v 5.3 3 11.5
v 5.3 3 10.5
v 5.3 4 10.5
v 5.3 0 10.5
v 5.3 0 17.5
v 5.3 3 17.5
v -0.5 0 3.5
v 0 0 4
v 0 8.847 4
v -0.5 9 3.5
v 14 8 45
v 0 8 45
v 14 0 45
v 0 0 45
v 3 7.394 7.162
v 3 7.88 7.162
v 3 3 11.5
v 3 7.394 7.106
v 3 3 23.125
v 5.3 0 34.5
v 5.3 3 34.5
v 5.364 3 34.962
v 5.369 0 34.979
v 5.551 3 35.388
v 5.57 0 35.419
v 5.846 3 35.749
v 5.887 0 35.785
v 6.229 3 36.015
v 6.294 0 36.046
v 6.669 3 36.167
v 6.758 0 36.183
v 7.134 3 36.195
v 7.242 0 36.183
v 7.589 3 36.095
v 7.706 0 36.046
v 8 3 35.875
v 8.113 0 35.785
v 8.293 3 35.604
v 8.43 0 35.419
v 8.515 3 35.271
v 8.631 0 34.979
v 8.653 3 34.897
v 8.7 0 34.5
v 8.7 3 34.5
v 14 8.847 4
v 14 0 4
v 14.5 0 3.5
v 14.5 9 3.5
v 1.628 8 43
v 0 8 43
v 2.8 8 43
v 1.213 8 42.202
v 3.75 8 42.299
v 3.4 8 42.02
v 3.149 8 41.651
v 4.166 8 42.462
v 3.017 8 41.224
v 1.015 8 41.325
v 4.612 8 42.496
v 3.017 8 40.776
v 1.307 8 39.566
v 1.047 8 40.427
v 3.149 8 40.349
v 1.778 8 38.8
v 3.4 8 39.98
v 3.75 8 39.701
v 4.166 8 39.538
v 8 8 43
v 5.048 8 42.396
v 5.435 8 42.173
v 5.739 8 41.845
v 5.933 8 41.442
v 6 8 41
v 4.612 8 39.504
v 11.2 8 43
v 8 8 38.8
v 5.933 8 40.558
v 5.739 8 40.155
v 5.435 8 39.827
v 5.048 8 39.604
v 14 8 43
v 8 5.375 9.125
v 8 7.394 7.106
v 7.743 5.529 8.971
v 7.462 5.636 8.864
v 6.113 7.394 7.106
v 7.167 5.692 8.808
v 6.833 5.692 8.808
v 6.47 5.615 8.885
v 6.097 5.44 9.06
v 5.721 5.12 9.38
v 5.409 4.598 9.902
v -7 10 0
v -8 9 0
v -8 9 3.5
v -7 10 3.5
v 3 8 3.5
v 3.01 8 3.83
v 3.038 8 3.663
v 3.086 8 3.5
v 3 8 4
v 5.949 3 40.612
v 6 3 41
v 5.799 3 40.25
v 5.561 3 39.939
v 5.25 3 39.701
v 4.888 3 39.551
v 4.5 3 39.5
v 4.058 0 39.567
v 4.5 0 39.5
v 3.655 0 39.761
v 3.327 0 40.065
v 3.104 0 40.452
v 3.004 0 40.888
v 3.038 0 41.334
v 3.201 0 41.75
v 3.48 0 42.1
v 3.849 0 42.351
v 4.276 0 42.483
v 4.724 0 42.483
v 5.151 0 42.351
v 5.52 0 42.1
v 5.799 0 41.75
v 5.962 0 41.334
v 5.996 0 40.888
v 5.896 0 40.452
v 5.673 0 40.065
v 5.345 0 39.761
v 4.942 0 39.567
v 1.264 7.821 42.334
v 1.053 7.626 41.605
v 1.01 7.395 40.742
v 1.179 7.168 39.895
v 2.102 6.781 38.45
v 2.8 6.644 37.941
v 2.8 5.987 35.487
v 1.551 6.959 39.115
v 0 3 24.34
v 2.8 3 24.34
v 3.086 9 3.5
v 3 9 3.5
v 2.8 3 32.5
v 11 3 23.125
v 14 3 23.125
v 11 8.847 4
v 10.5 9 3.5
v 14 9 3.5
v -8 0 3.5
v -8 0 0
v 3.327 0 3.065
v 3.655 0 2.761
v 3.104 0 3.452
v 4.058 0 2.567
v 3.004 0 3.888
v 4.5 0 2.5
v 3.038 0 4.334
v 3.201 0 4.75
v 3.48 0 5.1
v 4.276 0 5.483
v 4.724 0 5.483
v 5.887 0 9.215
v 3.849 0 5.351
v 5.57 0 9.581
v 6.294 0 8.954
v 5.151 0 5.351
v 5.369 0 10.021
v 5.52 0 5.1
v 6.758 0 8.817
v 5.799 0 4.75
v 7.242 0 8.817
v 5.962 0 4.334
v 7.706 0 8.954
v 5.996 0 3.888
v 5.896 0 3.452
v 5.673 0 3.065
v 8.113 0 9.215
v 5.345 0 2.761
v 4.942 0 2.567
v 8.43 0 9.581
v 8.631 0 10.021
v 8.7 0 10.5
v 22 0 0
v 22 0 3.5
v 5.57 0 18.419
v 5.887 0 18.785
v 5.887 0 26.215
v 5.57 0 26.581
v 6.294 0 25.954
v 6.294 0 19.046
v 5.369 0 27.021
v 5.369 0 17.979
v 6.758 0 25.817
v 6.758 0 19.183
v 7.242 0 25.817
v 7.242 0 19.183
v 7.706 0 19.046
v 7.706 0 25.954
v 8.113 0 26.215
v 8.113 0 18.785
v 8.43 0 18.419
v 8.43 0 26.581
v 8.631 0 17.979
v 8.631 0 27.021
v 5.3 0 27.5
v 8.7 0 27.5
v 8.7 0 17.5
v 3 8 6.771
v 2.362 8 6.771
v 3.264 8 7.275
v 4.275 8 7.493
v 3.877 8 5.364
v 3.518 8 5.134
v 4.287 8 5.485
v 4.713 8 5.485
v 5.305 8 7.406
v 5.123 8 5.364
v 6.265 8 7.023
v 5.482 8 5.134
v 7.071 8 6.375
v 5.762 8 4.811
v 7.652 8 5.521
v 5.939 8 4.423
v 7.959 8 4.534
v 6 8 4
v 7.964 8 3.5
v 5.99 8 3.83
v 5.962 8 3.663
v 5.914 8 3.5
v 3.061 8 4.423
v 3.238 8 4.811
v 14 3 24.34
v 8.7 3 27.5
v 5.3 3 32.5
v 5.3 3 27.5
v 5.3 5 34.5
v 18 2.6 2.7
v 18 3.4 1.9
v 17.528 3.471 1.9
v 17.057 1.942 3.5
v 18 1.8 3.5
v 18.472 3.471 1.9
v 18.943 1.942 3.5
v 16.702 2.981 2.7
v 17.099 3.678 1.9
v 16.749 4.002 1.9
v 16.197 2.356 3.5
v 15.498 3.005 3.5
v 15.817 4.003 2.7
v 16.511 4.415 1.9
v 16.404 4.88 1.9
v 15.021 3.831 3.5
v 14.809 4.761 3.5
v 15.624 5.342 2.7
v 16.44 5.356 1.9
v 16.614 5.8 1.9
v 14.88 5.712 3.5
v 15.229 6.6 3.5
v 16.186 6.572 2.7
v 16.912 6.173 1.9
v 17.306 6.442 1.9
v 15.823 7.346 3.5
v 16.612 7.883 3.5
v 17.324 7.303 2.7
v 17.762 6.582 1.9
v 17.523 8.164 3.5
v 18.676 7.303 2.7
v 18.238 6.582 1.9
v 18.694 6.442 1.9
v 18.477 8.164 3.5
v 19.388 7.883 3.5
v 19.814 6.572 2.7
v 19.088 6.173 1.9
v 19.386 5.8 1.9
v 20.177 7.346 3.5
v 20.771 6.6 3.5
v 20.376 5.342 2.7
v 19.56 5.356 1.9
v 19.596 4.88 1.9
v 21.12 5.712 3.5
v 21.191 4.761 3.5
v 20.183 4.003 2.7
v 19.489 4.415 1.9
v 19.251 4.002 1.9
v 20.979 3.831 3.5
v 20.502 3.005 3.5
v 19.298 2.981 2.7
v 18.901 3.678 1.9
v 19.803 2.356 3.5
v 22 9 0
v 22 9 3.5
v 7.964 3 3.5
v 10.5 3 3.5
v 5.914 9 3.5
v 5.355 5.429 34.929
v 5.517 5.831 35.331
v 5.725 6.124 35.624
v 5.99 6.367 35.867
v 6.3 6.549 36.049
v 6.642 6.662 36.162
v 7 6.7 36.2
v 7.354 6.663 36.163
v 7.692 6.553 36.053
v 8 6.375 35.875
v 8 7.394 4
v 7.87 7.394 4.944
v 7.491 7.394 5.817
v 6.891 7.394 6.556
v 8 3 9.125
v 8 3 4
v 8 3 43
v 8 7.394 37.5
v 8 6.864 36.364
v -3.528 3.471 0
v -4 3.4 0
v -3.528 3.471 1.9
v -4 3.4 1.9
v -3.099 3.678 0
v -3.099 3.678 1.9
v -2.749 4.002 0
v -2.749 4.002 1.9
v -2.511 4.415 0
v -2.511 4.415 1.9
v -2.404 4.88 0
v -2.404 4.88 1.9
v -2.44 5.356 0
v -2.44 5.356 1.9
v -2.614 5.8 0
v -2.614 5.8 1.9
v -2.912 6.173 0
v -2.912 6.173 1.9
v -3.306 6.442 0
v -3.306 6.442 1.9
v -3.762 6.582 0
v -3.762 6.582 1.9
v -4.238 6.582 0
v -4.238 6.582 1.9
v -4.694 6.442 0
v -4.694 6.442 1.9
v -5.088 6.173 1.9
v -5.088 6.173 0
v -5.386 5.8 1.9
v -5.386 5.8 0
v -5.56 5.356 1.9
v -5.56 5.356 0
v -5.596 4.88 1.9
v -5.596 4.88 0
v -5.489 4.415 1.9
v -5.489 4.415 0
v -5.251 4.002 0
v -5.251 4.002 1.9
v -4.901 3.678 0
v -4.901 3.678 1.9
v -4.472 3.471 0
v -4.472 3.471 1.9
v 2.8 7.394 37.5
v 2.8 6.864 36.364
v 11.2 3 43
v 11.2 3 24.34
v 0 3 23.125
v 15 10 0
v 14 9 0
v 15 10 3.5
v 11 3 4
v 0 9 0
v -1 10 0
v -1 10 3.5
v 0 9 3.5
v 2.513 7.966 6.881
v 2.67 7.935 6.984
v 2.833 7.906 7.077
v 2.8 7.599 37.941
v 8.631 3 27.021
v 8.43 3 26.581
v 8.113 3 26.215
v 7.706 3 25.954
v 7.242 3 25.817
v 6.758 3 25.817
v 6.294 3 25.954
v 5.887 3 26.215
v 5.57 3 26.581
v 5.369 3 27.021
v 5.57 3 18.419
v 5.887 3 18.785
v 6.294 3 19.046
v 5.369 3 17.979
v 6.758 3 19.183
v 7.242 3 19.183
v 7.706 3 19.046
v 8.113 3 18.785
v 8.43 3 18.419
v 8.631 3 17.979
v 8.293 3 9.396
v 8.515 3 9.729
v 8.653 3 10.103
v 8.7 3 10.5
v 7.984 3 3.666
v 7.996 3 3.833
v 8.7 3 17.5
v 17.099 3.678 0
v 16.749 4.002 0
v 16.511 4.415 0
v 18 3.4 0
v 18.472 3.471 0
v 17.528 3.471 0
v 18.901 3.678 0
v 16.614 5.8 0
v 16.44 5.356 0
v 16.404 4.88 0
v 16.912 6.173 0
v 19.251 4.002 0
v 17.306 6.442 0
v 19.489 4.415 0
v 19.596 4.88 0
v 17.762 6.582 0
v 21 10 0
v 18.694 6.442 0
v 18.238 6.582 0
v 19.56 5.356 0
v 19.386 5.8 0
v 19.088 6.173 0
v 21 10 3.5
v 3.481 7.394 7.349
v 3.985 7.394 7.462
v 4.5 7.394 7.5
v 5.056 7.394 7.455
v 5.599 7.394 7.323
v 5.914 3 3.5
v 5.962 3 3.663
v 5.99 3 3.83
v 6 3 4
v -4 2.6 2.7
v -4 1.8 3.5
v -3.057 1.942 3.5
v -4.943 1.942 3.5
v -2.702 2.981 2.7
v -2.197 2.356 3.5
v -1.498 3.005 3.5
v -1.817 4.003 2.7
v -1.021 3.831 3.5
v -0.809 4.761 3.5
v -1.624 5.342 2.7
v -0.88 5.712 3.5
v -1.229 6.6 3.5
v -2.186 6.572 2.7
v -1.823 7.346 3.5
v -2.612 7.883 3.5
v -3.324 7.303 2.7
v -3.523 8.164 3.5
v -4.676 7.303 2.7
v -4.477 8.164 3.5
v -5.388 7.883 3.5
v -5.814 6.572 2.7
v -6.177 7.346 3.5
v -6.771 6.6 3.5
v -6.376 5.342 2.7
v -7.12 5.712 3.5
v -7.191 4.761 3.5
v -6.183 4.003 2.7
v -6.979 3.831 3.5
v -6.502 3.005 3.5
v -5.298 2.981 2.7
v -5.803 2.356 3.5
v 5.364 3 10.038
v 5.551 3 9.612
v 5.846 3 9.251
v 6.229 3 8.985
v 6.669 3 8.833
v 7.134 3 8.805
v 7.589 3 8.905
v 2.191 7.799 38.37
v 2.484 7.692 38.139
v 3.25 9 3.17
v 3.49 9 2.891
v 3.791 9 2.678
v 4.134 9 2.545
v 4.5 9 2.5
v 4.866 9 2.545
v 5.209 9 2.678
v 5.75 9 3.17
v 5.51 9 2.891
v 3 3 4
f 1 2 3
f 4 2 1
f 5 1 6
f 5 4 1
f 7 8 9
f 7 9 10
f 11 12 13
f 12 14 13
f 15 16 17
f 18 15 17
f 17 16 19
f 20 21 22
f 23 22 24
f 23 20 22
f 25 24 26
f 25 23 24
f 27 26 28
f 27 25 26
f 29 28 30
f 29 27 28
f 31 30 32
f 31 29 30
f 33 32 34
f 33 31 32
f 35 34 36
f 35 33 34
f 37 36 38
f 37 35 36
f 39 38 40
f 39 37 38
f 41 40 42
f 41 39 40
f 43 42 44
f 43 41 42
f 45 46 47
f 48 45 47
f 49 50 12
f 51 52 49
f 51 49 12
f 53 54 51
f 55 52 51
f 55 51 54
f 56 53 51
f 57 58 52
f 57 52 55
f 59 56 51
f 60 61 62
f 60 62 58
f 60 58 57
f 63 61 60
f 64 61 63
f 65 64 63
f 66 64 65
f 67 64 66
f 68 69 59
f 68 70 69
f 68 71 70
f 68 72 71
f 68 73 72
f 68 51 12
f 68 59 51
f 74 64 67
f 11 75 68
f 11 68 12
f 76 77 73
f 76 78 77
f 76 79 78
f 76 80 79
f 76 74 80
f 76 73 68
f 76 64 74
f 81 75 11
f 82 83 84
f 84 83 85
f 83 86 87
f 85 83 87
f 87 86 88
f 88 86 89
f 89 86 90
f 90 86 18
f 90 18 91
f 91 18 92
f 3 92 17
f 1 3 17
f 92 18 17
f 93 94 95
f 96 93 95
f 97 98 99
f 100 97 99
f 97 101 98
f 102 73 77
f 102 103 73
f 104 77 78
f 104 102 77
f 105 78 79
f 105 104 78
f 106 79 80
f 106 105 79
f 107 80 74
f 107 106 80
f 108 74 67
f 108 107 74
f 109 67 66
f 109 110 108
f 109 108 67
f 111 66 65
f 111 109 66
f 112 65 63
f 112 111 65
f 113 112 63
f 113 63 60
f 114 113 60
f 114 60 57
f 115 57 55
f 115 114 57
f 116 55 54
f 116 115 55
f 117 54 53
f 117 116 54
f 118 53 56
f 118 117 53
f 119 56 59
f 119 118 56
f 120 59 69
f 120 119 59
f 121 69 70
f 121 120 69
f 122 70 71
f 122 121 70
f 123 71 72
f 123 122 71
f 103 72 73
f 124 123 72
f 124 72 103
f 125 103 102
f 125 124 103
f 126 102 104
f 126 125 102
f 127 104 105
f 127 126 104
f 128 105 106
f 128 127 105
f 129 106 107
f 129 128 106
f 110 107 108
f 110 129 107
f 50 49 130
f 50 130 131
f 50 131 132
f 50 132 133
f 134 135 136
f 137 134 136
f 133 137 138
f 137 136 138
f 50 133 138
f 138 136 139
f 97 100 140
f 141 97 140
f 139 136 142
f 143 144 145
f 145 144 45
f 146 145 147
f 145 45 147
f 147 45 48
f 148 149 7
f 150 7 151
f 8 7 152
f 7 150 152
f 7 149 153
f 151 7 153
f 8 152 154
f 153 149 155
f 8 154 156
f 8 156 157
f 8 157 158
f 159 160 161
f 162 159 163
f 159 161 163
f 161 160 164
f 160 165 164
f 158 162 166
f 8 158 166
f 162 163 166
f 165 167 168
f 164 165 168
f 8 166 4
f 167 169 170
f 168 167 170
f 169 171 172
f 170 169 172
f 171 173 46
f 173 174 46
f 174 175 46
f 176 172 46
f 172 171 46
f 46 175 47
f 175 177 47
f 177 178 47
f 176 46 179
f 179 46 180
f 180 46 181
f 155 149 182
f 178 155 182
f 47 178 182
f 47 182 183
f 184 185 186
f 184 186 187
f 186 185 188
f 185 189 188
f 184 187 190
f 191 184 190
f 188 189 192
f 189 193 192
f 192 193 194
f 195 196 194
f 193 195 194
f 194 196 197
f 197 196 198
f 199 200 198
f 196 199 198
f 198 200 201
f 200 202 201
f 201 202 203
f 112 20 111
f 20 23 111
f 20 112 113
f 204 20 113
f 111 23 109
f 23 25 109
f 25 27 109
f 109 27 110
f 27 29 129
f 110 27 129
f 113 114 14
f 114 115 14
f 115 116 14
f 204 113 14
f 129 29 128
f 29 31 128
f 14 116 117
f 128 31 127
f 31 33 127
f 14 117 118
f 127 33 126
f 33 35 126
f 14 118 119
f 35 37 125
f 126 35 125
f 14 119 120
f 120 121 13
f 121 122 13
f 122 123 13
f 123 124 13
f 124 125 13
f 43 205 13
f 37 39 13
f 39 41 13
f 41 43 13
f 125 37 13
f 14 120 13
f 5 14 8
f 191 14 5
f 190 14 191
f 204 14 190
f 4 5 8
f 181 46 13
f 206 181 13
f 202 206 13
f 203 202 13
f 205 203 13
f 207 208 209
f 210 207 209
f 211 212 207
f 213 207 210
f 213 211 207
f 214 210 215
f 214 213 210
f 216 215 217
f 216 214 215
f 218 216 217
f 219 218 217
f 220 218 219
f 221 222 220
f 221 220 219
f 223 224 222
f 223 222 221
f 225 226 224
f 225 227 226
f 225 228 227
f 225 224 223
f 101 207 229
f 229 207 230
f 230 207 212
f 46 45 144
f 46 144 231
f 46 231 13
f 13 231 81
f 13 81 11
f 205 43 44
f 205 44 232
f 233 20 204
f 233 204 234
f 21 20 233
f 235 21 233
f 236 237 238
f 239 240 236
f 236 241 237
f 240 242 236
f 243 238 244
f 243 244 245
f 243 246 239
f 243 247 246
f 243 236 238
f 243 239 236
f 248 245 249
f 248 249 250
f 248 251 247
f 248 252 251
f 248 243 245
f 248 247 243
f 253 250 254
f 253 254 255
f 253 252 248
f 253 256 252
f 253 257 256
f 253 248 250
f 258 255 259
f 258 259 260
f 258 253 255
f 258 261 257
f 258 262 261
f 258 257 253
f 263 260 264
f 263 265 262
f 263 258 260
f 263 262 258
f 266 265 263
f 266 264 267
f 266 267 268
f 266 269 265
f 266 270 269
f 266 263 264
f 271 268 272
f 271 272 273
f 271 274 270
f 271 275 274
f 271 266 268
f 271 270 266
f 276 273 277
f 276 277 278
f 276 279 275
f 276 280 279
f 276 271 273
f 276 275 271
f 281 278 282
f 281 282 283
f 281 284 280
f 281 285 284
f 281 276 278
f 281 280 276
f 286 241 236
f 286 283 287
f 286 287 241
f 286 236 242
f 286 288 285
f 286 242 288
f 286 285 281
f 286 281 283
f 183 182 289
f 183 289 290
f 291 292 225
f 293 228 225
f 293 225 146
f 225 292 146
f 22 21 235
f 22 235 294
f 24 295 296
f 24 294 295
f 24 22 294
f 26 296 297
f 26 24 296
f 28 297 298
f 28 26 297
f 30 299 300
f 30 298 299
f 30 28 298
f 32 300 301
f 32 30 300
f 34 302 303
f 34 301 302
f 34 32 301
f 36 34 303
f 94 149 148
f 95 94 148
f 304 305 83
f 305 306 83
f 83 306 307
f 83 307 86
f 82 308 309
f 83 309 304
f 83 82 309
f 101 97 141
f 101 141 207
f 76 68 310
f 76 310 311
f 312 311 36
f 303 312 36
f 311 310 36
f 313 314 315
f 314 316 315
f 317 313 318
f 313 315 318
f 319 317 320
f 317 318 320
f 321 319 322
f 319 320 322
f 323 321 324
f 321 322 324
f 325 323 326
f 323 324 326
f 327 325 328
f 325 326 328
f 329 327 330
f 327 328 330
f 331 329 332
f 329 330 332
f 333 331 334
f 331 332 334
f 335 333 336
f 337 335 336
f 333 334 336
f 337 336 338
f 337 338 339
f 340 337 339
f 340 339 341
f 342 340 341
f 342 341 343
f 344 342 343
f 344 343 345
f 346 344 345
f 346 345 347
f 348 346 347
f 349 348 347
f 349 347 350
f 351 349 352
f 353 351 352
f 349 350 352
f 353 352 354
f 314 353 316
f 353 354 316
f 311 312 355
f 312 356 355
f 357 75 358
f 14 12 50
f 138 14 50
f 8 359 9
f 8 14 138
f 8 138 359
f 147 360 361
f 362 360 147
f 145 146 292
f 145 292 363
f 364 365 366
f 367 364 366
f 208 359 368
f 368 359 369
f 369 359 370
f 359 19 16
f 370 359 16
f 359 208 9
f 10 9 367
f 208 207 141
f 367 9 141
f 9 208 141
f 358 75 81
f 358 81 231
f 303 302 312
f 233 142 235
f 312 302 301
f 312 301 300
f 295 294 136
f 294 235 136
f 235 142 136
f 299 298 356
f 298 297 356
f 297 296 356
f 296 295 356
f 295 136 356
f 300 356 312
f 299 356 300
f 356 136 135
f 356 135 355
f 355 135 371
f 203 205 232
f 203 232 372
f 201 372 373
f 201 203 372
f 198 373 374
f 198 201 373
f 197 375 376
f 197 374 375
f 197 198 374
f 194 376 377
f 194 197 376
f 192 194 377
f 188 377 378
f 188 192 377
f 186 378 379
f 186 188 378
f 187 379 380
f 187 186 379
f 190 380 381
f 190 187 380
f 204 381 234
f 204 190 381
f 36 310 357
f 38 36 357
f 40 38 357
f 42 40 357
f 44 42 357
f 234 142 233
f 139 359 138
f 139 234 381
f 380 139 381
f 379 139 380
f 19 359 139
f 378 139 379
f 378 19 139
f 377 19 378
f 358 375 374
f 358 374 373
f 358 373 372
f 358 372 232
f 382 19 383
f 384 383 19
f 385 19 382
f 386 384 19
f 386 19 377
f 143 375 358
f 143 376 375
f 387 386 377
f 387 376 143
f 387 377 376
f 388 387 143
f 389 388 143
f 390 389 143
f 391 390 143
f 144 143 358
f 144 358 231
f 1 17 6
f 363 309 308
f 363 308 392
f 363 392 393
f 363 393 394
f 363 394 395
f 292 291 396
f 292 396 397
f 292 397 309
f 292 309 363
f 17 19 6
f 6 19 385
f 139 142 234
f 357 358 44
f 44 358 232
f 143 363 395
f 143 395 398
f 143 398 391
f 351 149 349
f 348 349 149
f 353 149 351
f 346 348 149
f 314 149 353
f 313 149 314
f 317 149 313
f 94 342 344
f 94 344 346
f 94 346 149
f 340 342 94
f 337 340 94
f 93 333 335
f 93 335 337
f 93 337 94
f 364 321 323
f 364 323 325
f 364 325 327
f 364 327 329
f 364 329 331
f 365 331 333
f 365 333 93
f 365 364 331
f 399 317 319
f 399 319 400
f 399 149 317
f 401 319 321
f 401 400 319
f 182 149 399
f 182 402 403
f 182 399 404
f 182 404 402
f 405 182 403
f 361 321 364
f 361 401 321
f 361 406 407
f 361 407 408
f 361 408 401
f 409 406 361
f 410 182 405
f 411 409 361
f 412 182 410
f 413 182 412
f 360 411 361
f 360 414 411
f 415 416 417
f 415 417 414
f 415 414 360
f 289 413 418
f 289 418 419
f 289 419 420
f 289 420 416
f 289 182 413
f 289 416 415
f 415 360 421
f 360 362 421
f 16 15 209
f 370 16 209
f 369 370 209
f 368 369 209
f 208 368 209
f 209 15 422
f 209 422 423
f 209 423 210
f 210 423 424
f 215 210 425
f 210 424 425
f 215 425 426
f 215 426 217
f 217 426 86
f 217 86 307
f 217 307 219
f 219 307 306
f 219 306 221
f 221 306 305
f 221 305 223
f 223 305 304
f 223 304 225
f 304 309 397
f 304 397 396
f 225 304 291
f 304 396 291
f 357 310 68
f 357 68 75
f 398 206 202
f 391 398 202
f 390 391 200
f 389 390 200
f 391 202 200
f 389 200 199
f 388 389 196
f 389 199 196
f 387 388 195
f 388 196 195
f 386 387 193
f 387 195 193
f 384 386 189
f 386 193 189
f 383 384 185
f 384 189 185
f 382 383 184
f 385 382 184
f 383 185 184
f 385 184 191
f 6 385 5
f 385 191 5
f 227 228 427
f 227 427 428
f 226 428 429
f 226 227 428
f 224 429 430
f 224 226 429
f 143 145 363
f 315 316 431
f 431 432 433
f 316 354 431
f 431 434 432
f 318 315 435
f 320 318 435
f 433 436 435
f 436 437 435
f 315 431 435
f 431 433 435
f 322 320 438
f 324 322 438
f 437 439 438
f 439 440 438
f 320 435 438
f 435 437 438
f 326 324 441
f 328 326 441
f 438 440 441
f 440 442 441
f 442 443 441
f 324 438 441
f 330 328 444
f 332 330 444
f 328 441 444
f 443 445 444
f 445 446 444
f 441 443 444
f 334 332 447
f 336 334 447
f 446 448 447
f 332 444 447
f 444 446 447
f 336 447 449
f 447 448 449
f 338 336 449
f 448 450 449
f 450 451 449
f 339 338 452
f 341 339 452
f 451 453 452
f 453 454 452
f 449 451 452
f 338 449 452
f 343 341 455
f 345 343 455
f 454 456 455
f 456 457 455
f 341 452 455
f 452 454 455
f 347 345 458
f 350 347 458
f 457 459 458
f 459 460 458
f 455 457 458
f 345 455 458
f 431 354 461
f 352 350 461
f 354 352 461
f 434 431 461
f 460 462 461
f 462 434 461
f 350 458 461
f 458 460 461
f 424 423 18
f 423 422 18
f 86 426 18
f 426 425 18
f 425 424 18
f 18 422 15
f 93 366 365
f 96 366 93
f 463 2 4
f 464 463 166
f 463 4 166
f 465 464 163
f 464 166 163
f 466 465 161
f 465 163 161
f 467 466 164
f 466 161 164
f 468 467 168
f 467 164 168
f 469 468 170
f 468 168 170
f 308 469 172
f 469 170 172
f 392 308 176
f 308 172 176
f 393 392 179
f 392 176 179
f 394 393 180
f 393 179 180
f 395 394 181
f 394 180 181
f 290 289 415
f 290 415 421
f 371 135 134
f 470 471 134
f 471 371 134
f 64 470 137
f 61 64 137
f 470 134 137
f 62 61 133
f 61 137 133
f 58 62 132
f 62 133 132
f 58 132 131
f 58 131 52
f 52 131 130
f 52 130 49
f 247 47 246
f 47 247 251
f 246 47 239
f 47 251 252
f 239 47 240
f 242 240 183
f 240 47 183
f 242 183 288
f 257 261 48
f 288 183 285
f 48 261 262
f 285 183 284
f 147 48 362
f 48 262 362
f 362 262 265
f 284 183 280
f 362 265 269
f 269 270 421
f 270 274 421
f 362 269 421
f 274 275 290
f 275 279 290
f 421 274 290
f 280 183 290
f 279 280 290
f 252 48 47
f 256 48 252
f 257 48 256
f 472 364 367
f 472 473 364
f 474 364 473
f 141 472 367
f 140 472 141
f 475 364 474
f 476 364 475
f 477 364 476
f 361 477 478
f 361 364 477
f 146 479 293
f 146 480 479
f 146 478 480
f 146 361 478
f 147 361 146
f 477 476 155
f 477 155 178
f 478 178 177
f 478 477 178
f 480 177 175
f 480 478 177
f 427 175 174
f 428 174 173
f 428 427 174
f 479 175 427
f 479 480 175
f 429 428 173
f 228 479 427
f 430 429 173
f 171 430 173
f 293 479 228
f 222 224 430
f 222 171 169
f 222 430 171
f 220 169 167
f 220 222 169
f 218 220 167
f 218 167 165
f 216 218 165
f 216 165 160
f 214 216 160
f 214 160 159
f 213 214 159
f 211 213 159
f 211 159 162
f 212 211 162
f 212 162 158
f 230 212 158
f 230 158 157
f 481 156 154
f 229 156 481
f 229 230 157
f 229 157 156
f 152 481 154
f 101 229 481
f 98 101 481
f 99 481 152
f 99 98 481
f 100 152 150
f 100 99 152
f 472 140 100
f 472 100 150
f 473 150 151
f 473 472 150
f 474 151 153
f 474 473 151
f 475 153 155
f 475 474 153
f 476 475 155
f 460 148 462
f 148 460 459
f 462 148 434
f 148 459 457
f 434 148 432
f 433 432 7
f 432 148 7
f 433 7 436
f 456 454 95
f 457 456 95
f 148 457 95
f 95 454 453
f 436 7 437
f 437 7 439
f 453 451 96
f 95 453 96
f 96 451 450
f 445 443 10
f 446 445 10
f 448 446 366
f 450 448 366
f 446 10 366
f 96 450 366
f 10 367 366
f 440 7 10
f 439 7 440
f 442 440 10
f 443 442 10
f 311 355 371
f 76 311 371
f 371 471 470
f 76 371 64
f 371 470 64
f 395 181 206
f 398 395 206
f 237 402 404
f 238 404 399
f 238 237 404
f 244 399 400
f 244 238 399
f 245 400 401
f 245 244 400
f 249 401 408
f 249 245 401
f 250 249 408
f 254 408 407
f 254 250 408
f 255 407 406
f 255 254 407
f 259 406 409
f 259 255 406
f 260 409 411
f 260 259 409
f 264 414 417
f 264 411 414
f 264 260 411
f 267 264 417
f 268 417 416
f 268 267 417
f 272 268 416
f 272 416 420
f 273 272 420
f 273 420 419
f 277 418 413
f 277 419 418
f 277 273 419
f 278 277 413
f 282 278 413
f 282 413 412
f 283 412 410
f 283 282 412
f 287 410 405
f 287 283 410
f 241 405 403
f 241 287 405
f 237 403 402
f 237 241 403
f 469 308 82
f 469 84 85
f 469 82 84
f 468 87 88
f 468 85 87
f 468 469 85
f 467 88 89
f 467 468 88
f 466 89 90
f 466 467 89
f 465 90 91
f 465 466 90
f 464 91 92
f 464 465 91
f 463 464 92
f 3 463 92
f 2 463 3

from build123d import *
from build123d.topology import SkipClean

# Parameters (mm, degrees)
SKETCH_1_W               = 14
SKETCH_1_H               = 45
EXTRUDE_1_DEPTH          = 3
SKETCH_4_W               = 8
SKETCH_4_H               = 3.5
EXTRUDE_2_DEPTH          = 10
SKETCH_10_W              = 3.5
SKETCH_10_H              = 6
EXTRUDE_3_DEPTH          = 14
CUT_EXTRUDE_1_DEPTH      = 52.078371156
CUT_EXTRUDE_1_DEPTH_BACK = 52.078371156
SKETCH_2_R               = 1.5
SKETCH_3_R               = 3.5
SKETCH_3_R_2             = 1.5
EXTRUDE_1_2_DEPTH        = 5
SKETCH_12_W              = 14
SKETCH_12_H              = 2
EXTRUDE_4_DEPTH          = 5
RIB_9_REACH              = 53.078
SKETCH_13_WALL_W         = 123.475258838
SKETCH_13_WALL_H         = 2.8
RIB_8_REACH              = 53.078
SKETCH_11_WALL_W         = 124.678564032
SKETCH_11_WALL_H         = 3
CHAMFER_3_SIZE           = 0.5
CHAMFER_4_SIZE           = 1
EXTRUDE_5_REACH          = 46.612
EXTRUDE_5_END_RADIUS     = 3.5
SKETCH_15_W              = 5.2
SKETCH_15_H              = 5
CHAMFER_5_SIZE           = 0.606199956
CHAMFER_5_SIZE_2         = 1.3
CUT_EXTRUDE_2_DEPTH      = 4
EXTRUDE_START            = 3
EXTRUDE_6_DEPTH          = 4.393800044
CUT_EXTRUDE_3_DEPTH      = 1
CHAMFER_START            = 2.8
CHAMFER_6_DEPTH          = 2.5
CHAMFER_START_2          = 5.3
CHAMFER_6_2_DEPTH        = 2.7
CHAMFER_START_3          = 3
CHAMFER_6_3_DEPTH        = 3.7
DELETE_START             = 2
DELETE_FACE_1_DEPTH      = 6


with BuildPart() as part:
    # 草图1 → Extrude 1 (new body)
    with BuildSketch(Plane(origin=(0, 0, 0), x_dir=(1, 0, 0), z_dir=(0, 1, 0))):
        with Locations((7, -22.5)):
            Rectangle(SKETCH_1_W, SKETCH_1_H)
    extrude(amount=EXTRUDE_1_DEPTH)

    # 草图4 → 凸台-拉伸2 (add)
    with BuildSketch(Plane.XZ):
        with Locations((18, 1.75)):
            Rectangle(SKETCH_4_W, SKETCH_4_H)
    extrude_2 = extrude(amount=-EXTRUDE_2_DEPTH)

    # 草图9 → 打孔尺寸(%根据)内六角花形半沉头螺钉的类型1 (revolve, cut)
    with BuildSketch(Plane(origin=(18, 5, 3.5), x_dir=(0, -1, 0), z_dir=(1, 0, 0))):
        Polygon((0, 0), (0, 5.96137699), (1.6, 5), (1.6, 1.6), (3.2, 0), align=None)
    hole_wizard_1 = revolve(axis=Axis((18, 5, 9.85), (0, 0, -1)), mode=Mode.SUBTRACT)

    # 镜向1: 凸台-拉伸2, 打孔尺寸(%根据)内六角花形半沉头螺钉的类型1 across plane
    add(extrude_2.mirror(Plane(origin=(7, 0, 0), x_dir=(0, 0, 1), z_dir=(1, 0, 0))))
    add(hole_wizard_1.mirror(Plane(origin=(7, 0, 0), x_dir=(0, 0, 1), z_dir=(1, 0, 0))), mode=Mode.SUBTRACT)

    # 草图10 → 凸台-拉伸3 (add)
    with BuildSketch(Plane.ZY.offset(-14)):
        with Locations((1.75, 6)):
            Rectangle(SKETCH_10_W, SKETCH_10_H)
    extrude(amount=EXTRUDE_3_DEPTH)

    # 草图2 → 切除-拉伸1 (cut, two sides: drawn at the far end of the back side and taken through both)
    with BuildSketch(Plane.XZ.offset(-CUT_EXTRUDE_1_DEPTH_BACK)):
        with Locations(Location((4.5, 41, 0), (0, 0, 270))):
            Circle(SKETCH_2_R)
        with Locations(Location((4.5, 4, 0), (0, 0, 270))):
            Circle(SKETCH_2_R)
    extrude(amount=CUT_EXTRUDE_1_DEPTH + CUT_EXTRUDE_1_DEPTH_BACK, mode=Mode.SUBTRACT)

    # 草图3 → Extrude 1 2 (add)
    # profile 1 of 2: a face of its own
    with SkipClean():  # the faces are left unmerged after this step: merging them gives an invalid solid
        with BuildSketch(Plane(origin=(0, 3, 0), x_dir=(1, 0, 0), z_dir=(0, 1, 0))):
            with Locations((4.5, -41)):
                Circle(SKETCH_3_R)
            with Locations((4.5, -41)):
                Circle(SKETCH_3_R_2, mode=Mode.SUBTRACT)
        # profile 2 of 2: a face of its own
        with BuildSketch(Plane(origin=(0, 3, 0), x_dir=(1, 0, 0), z_dir=(0, 1, 0))):
            with Locations((4.5, -4)):
                Circle(SKETCH_3_R)
            with Locations((4.5, -4)):
                Circle(SKETCH_3_R_2, mode=Mode.SUBTRACT)
        extrude(amount=EXTRUDE_1_2_DEPTH)

    # 草图12 → 凸台-拉伸4 (add)
    with SkipClean():  # the faces are left unmerged after this step: merging them gives an invalid solid
        with BuildSketch(Plane(origin=(0, 3, 0), x_dir=(1, 0, 0), z_dir=(0, 1, 0))):
            with Locations((7, -44)):
                Rectangle(SKETCH_12_W, SKETCH_12_H)
        extrude(amount=EXTRUDE_4_DEPTH)

    # 草图13 wall → 筋9 (add, up to next)
    with BuildSketch(Plane(origin=(14, 5.5, 33.669872981), x_dir=(0, -0.258819045101, -0.96592582629), z_dir=(0, 0.96592582629, -0.258819045101)), mode=Mode.PRIVATE) as rib_9_sk1:
        with Locations((0, 1.4)):
            Rectangle(SKETCH_13_WALL_W, SKETCH_13_WALL_H)
    rib_9_tool1 = extrude(rib_9_sk1.sketch, amount=-RIB_9_REACH, mode=Mode.PRIVATE) - part.part
    rib_9 = rib_9_tool1.solids().sort_by_distance((14, 5.5, 33.669872981))[0]
    add(rib_9)

    # 草图11 wall → 筋8 (add, up to next)
    with BuildSketch(Plane(origin=(14, 6, 13.312557855), x_dir=(0, -0.292371704721, 0.956304755963), z_dir=(0, -0.956304755963, -0.292371704721)), mode=Mode.PRIVATE) as rib_8_sk1:
        with Locations((0, 1.5)):
            Rectangle(SKETCH_11_WALL_W, SKETCH_11_WALL_H)
    rib_8_tool1 = extrude(rib_8_sk1.sketch, amount=RIB_8_REACH, mode=Mode.PRIVATE) - part.part
    rib_8 = rib_8_tool1.solids().sort_by_distance((14, 6, 13.312557855))[0]
    add(rib_8)

    # 镜向2: 筋9, 筋8 across plane
    with SkipClean():  # the faces are left unmerged after this step: merging them gives an invalid solid
        add(rib_9.mirror(Plane(origin=(7, 0, 0), x_dir=(0, 0, 1), z_dir=(1, 0, 0))))
        add(rib_8.mirror(Plane(origin=(7, 0, 0), x_dir=(0, 0, 1), z_dir=(1, 0, 0))))

    # 倒角3
    # the kernel refuses this chamfer: 0.5 mm, written as the material it adds along each edge
    with BuildSketch(Plane(origin=(14, 3, 3.5), x_dir=(1, 0, 0), z_dir=(0, 1, 0))) as chamfer_3_piece_1_section:
        Polygon((CHAMFER_3_SIZE, 0), (0, -CHAMFER_3_SIZE), (0, 0), align=None)
    chamfer_3_piece_1 = extrude(amount=7.285841494, mode=Mode.PRIVATE)
    chamfer_3_piece_1 = split(chamfer_3_piece_1, bisect_by=Plane(origin=(14, 8.487112718, 5.17757871), z_dir=(0, -0.956304755963518, -0.29237170472115837)), keep=Keep.TOP, mode=Mode.PRIVATE)
    add(chamfer_3_piece_1)
    with BuildSketch(Plane(origin=(11, 10.285841494, 3.5), x_dir=(-1, 0, 0), z_dir=(0, -1, 0))) as chamfer_3_piece_2_section:
        Polygon((CHAMFER_3_SIZE, 0), (0, -CHAMFER_3_SIZE), (0, 0), align=None)
    chamfer_3_piece_2 = extrude(amount=8.571682988, mode=Mode.PRIVATE)
    chamfer_3_piece_2 = split(chamfer_3_piece_2, bisect_by=Plane(origin=(11, 9.109915291, 3.140483281), z_dir=(0, -0.956304755963518, -0.29237170472115837)), keep=Keep.TOP, mode=Mode.PRIVATE)
    add(chamfer_3_piece_2)
    with BuildSketch(Plane(origin=(0, 3, 3.5), x_dir=(0, 0, 1), z_dir=(0, 1, 0))) as chamfer_3_piece_3_section:
        Polygon((CHAMFER_3_SIZE, 0), (0, -CHAMFER_3_SIZE), (0, 0), align=None)
    chamfer_3_piece_3 = extrude(amount=7.285841494, mode=Mode.PRIVATE)
    chamfer_3_piece_3 = split(chamfer_3_piece_3, bisect_by=Plane(origin=(0, 8.487112718, 5.17757871), z_dir=(0, -0.956304755963518, -0.29237170472115837)), keep=Keep.TOP, mode=Mode.PRIVATE)
    add(chamfer_3_piece_3)
    with BuildSketch(Plane(origin=(0, 0, 3.5), x_dir=(0, 0, 1), z_dir=(0, 1, 0))) as chamfer_3_piece_4:
        Polygon((CHAMFER_3_SIZE, 0), (0, -CHAMFER_3_SIZE), (0, 0), align=None)
    extrude(amount=3)
    with BuildSketch(Plane(origin=(14, 0, 3.5), x_dir=(0, 0, 1), z_dir=(0, 1, 0))) as chamfer_3_piece_5:
        Polygon((CHAMFER_3_SIZE, 0), (0, CHAMFER_3_SIZE), (0, 0), align=None)
    extrude(amount=3)

    # 倒角4
    chamfer_4_edges = [part.edges().sort_by_distance(p)[0] for p in [
        (-8, 10, 1.75),
        (0, 10, 1.75),
        (14, 10, 1.75),
        (22, 10, 1.75),
    ]]
    chamfer(chamfer_4_edges, length=CHAMFER_4_SIZE - 0.0001)  # a hair under: the kernel refuses the full size

    # 凸台-拉伸5: up to this cylinder (the profile starts outside it)
    extrude_5_end = Plane(origin=(4.5, 5.5, 41), z_dir=(0, -1, 0)) * Cylinder(EXTRUDE_5_END_RADIUS, 101.224, mode=Mode.PRIVATE)
    # 草图15 → 凸台-拉伸5 (add, up to the surface)
    with BuildSketch(Plane(origin=(0, 0, 37.5), x_dir=(-1, 0, 0), z_dir=(0, 0, -1)), mode=Mode.PRIVATE) as extrude_5_sk1:
        with Locations((-5.4, 5.5)):
            Rectangle(SKETCH_15_W, SKETCH_15_H)
    extrude_5_tool1 = extrude(extrude_5_sk1.sketch, amount=-EXTRUDE_5_REACH, mode=Mode.PRIVATE) - extrude_5_end
    add(extrude_5_tool1.solids().sort_by_distance((5.4, 5.5, 37.5))[0])
    add(extrude_5_tool1.solids().sort_by_distance((5.4, 5.5, 37.5))[1])

    # 倒角5
    # the kernel refuses this chamfer: 1.3, 0.606199956 mm, written as the material it takes off along each edge
    with BuildSketch(Plane(origin=(4.5, 8, 37.5), x_dir=(0, -1, 0), z_dir=(1, 0, 0))) as chamfer_5_piece_1:
        Polygon((CHAMFER_5_SIZE, 0), (0, -CHAMFER_5_SIZE_2), (0, 0), align=None)
    extrude(amount=6.868268113, mode=Mode.SUBTRACT)
    with BuildSketch(Plane(origin=(-0.568268113, 8, 37.5), x_dir=(0, -1, 0), z_dir=(1, 0, 0))) as chamfer_5_piece_2:
        Polygon((CHAMFER_5_SIZE, 0), (0, -CHAMFER_5_SIZE_2), (0, 0), align=None)
    extrude(amount=5.068268113, mode=Mode.SUBTRACT)

    # 草图14 → 切除-拉伸2 (cut)
    with BuildSketch(Plane.XZ):
        with BuildLine():
            Line((8.7, 34.5), (8.7, 27.5))
            ThreePointArc((8.7, 27.5), (7, 25.8), (5.3, 27.5))
            Line((5.3, 27.5), (5.3, 34.5))
            ThreePointArc((5.3, 34.5), (7, 36.2), (8.7, 34.5))
        make_face()
        with BuildLine():
            Line((8.7, 10.5), (8.7, 17.5))
            ThreePointArc((8.7, 17.5), (7, 19.2), (5.3, 17.5))
            Line((5.3, 17.5), (5.3, 10.5))
            ThreePointArc((5.3, 10.5), (7, 8.8), (8.7, 10.5))
        make_face()
    extrude(amount=-CUT_EXTRUDE_2_DEPTH, mode=Mode.SUBTRACT)

    # 凸台-拉伸6: read off the stored shape, not the designer's step
    # 凸台-拉伸6 outline → 凸台-拉伸6 (add)
    with BuildSketch(Plane(origin=(0, 0, 0), x_dir=(1, 0, 0), z_dir=(0, 1, 0)).offset(EXTRUDE_START)):
        with BuildLine():
            Line((4.5, -7.5), (8, -7.5))
            Line((8, -7.5), (8, -4))
            ThreePointArc((8, -4), (6.974873734, -6.474873734), (4.5, -7.5))
        make_face()
        with BuildLine():
            Line((3, -7.5), (4.5, -7.5))
            ThreePointArc((4.5, -7.5), (3.731225589, -7.414525722), (3, -7.16227766))
            Line((3, -7.16227766), (3, -7.5))
        make_face()
    extrude(amount=EXTRUDE_6_DEPTH)

    # 草图21 → 切除-拉伸3 (cut)
    with BuildSketch(Plane.XY.offset(7.5)):
        Polygon((3, 7.393800044), (3, 3), (8, 3), (8, 7.393800044), (4.5, 7.393800044), align=None)
    extrude(amount=-CUT_EXTRUDE_3_DEPTH, mode=Mode.SUBTRACT)

    # 倒角6: read off the stored shape, not the designer's step
    # 倒角6 outline → 倒角6 (add)
    with BuildSketch(Plane.YZ.offset(CHAMFER_START)):
        Polygon((3, 6.5), (7.393800044, 6.5), (7.393800044, 7.106199956), (3, 11.5), align=None)
        Polygon((3, 37.5), (3, 32.5), (6.864139677, 36.364139677), (7.393800044, 37.5), align=None)
    extrude(amount=CHAMFER_6_DEPTH)

    # Chamfer 6 2 outline → Chamfer 6 2 (add)
    with BuildSketch(Plane.YZ.offset(CHAMFER_START_2)):
        Polygon((3, 6.5), (7.393800044, 6.5), (7.393800044, 7.106199956), (3, 11.5), align=None)
        Polygon((3, 37.5), (3, 32.5), (6.864139677, 36.364139677), (7.393800044, 37.5), align=None)
    extrude(amount=CHAMFER_6_2_DEPTH)

    # Chamfer 6 3 outline → Chamfer 6 3 (cut)
    with BuildSketch(Plane(origin=(0, 0, 0), x_dir=(1, 0, 0), z_dir=(0, 1, 0)).offset(CHAMFER_START_3)):
        with BuildLine():
            ThreePointArc((8, -9.125227292), (6.228637569, -8.985074259), (5.3, -10.5))
            Line((5.3, -10.5), (5.3, -34.5))
            ThreePointArc((5.3, -34.5), (6.228637569, -36.014925741), (8, -35.874772708))
            Line((8, -35.874772708), (8, -9.125227292))
        make_face()
    extrude(amount=CHAMFER_6_3_DEPTH, mode=Mode.SUBTRACT)

    # Delete Face 1: read off the stored shape, not the designer's step
    # Delete Face 1 outline → Delete Face 1 (add)
    with BuildSketch(Plane(origin=(0, 0, 0), x_dir=(1, 0, 0), z_dir=(0, 1, 0)).offset(DELETE_START)):
        with BuildLine():
            Line((7.372281323, -43), (8, -43))
            Line((8, -43), (8, -41))
            ThreePointArc((8, -41), (7.839385021, -42.048097173), (7.372281323, -43))
        make_face()
    extrude(amount=DELETE_FACE_1_DEPTH)


solid = part.part
